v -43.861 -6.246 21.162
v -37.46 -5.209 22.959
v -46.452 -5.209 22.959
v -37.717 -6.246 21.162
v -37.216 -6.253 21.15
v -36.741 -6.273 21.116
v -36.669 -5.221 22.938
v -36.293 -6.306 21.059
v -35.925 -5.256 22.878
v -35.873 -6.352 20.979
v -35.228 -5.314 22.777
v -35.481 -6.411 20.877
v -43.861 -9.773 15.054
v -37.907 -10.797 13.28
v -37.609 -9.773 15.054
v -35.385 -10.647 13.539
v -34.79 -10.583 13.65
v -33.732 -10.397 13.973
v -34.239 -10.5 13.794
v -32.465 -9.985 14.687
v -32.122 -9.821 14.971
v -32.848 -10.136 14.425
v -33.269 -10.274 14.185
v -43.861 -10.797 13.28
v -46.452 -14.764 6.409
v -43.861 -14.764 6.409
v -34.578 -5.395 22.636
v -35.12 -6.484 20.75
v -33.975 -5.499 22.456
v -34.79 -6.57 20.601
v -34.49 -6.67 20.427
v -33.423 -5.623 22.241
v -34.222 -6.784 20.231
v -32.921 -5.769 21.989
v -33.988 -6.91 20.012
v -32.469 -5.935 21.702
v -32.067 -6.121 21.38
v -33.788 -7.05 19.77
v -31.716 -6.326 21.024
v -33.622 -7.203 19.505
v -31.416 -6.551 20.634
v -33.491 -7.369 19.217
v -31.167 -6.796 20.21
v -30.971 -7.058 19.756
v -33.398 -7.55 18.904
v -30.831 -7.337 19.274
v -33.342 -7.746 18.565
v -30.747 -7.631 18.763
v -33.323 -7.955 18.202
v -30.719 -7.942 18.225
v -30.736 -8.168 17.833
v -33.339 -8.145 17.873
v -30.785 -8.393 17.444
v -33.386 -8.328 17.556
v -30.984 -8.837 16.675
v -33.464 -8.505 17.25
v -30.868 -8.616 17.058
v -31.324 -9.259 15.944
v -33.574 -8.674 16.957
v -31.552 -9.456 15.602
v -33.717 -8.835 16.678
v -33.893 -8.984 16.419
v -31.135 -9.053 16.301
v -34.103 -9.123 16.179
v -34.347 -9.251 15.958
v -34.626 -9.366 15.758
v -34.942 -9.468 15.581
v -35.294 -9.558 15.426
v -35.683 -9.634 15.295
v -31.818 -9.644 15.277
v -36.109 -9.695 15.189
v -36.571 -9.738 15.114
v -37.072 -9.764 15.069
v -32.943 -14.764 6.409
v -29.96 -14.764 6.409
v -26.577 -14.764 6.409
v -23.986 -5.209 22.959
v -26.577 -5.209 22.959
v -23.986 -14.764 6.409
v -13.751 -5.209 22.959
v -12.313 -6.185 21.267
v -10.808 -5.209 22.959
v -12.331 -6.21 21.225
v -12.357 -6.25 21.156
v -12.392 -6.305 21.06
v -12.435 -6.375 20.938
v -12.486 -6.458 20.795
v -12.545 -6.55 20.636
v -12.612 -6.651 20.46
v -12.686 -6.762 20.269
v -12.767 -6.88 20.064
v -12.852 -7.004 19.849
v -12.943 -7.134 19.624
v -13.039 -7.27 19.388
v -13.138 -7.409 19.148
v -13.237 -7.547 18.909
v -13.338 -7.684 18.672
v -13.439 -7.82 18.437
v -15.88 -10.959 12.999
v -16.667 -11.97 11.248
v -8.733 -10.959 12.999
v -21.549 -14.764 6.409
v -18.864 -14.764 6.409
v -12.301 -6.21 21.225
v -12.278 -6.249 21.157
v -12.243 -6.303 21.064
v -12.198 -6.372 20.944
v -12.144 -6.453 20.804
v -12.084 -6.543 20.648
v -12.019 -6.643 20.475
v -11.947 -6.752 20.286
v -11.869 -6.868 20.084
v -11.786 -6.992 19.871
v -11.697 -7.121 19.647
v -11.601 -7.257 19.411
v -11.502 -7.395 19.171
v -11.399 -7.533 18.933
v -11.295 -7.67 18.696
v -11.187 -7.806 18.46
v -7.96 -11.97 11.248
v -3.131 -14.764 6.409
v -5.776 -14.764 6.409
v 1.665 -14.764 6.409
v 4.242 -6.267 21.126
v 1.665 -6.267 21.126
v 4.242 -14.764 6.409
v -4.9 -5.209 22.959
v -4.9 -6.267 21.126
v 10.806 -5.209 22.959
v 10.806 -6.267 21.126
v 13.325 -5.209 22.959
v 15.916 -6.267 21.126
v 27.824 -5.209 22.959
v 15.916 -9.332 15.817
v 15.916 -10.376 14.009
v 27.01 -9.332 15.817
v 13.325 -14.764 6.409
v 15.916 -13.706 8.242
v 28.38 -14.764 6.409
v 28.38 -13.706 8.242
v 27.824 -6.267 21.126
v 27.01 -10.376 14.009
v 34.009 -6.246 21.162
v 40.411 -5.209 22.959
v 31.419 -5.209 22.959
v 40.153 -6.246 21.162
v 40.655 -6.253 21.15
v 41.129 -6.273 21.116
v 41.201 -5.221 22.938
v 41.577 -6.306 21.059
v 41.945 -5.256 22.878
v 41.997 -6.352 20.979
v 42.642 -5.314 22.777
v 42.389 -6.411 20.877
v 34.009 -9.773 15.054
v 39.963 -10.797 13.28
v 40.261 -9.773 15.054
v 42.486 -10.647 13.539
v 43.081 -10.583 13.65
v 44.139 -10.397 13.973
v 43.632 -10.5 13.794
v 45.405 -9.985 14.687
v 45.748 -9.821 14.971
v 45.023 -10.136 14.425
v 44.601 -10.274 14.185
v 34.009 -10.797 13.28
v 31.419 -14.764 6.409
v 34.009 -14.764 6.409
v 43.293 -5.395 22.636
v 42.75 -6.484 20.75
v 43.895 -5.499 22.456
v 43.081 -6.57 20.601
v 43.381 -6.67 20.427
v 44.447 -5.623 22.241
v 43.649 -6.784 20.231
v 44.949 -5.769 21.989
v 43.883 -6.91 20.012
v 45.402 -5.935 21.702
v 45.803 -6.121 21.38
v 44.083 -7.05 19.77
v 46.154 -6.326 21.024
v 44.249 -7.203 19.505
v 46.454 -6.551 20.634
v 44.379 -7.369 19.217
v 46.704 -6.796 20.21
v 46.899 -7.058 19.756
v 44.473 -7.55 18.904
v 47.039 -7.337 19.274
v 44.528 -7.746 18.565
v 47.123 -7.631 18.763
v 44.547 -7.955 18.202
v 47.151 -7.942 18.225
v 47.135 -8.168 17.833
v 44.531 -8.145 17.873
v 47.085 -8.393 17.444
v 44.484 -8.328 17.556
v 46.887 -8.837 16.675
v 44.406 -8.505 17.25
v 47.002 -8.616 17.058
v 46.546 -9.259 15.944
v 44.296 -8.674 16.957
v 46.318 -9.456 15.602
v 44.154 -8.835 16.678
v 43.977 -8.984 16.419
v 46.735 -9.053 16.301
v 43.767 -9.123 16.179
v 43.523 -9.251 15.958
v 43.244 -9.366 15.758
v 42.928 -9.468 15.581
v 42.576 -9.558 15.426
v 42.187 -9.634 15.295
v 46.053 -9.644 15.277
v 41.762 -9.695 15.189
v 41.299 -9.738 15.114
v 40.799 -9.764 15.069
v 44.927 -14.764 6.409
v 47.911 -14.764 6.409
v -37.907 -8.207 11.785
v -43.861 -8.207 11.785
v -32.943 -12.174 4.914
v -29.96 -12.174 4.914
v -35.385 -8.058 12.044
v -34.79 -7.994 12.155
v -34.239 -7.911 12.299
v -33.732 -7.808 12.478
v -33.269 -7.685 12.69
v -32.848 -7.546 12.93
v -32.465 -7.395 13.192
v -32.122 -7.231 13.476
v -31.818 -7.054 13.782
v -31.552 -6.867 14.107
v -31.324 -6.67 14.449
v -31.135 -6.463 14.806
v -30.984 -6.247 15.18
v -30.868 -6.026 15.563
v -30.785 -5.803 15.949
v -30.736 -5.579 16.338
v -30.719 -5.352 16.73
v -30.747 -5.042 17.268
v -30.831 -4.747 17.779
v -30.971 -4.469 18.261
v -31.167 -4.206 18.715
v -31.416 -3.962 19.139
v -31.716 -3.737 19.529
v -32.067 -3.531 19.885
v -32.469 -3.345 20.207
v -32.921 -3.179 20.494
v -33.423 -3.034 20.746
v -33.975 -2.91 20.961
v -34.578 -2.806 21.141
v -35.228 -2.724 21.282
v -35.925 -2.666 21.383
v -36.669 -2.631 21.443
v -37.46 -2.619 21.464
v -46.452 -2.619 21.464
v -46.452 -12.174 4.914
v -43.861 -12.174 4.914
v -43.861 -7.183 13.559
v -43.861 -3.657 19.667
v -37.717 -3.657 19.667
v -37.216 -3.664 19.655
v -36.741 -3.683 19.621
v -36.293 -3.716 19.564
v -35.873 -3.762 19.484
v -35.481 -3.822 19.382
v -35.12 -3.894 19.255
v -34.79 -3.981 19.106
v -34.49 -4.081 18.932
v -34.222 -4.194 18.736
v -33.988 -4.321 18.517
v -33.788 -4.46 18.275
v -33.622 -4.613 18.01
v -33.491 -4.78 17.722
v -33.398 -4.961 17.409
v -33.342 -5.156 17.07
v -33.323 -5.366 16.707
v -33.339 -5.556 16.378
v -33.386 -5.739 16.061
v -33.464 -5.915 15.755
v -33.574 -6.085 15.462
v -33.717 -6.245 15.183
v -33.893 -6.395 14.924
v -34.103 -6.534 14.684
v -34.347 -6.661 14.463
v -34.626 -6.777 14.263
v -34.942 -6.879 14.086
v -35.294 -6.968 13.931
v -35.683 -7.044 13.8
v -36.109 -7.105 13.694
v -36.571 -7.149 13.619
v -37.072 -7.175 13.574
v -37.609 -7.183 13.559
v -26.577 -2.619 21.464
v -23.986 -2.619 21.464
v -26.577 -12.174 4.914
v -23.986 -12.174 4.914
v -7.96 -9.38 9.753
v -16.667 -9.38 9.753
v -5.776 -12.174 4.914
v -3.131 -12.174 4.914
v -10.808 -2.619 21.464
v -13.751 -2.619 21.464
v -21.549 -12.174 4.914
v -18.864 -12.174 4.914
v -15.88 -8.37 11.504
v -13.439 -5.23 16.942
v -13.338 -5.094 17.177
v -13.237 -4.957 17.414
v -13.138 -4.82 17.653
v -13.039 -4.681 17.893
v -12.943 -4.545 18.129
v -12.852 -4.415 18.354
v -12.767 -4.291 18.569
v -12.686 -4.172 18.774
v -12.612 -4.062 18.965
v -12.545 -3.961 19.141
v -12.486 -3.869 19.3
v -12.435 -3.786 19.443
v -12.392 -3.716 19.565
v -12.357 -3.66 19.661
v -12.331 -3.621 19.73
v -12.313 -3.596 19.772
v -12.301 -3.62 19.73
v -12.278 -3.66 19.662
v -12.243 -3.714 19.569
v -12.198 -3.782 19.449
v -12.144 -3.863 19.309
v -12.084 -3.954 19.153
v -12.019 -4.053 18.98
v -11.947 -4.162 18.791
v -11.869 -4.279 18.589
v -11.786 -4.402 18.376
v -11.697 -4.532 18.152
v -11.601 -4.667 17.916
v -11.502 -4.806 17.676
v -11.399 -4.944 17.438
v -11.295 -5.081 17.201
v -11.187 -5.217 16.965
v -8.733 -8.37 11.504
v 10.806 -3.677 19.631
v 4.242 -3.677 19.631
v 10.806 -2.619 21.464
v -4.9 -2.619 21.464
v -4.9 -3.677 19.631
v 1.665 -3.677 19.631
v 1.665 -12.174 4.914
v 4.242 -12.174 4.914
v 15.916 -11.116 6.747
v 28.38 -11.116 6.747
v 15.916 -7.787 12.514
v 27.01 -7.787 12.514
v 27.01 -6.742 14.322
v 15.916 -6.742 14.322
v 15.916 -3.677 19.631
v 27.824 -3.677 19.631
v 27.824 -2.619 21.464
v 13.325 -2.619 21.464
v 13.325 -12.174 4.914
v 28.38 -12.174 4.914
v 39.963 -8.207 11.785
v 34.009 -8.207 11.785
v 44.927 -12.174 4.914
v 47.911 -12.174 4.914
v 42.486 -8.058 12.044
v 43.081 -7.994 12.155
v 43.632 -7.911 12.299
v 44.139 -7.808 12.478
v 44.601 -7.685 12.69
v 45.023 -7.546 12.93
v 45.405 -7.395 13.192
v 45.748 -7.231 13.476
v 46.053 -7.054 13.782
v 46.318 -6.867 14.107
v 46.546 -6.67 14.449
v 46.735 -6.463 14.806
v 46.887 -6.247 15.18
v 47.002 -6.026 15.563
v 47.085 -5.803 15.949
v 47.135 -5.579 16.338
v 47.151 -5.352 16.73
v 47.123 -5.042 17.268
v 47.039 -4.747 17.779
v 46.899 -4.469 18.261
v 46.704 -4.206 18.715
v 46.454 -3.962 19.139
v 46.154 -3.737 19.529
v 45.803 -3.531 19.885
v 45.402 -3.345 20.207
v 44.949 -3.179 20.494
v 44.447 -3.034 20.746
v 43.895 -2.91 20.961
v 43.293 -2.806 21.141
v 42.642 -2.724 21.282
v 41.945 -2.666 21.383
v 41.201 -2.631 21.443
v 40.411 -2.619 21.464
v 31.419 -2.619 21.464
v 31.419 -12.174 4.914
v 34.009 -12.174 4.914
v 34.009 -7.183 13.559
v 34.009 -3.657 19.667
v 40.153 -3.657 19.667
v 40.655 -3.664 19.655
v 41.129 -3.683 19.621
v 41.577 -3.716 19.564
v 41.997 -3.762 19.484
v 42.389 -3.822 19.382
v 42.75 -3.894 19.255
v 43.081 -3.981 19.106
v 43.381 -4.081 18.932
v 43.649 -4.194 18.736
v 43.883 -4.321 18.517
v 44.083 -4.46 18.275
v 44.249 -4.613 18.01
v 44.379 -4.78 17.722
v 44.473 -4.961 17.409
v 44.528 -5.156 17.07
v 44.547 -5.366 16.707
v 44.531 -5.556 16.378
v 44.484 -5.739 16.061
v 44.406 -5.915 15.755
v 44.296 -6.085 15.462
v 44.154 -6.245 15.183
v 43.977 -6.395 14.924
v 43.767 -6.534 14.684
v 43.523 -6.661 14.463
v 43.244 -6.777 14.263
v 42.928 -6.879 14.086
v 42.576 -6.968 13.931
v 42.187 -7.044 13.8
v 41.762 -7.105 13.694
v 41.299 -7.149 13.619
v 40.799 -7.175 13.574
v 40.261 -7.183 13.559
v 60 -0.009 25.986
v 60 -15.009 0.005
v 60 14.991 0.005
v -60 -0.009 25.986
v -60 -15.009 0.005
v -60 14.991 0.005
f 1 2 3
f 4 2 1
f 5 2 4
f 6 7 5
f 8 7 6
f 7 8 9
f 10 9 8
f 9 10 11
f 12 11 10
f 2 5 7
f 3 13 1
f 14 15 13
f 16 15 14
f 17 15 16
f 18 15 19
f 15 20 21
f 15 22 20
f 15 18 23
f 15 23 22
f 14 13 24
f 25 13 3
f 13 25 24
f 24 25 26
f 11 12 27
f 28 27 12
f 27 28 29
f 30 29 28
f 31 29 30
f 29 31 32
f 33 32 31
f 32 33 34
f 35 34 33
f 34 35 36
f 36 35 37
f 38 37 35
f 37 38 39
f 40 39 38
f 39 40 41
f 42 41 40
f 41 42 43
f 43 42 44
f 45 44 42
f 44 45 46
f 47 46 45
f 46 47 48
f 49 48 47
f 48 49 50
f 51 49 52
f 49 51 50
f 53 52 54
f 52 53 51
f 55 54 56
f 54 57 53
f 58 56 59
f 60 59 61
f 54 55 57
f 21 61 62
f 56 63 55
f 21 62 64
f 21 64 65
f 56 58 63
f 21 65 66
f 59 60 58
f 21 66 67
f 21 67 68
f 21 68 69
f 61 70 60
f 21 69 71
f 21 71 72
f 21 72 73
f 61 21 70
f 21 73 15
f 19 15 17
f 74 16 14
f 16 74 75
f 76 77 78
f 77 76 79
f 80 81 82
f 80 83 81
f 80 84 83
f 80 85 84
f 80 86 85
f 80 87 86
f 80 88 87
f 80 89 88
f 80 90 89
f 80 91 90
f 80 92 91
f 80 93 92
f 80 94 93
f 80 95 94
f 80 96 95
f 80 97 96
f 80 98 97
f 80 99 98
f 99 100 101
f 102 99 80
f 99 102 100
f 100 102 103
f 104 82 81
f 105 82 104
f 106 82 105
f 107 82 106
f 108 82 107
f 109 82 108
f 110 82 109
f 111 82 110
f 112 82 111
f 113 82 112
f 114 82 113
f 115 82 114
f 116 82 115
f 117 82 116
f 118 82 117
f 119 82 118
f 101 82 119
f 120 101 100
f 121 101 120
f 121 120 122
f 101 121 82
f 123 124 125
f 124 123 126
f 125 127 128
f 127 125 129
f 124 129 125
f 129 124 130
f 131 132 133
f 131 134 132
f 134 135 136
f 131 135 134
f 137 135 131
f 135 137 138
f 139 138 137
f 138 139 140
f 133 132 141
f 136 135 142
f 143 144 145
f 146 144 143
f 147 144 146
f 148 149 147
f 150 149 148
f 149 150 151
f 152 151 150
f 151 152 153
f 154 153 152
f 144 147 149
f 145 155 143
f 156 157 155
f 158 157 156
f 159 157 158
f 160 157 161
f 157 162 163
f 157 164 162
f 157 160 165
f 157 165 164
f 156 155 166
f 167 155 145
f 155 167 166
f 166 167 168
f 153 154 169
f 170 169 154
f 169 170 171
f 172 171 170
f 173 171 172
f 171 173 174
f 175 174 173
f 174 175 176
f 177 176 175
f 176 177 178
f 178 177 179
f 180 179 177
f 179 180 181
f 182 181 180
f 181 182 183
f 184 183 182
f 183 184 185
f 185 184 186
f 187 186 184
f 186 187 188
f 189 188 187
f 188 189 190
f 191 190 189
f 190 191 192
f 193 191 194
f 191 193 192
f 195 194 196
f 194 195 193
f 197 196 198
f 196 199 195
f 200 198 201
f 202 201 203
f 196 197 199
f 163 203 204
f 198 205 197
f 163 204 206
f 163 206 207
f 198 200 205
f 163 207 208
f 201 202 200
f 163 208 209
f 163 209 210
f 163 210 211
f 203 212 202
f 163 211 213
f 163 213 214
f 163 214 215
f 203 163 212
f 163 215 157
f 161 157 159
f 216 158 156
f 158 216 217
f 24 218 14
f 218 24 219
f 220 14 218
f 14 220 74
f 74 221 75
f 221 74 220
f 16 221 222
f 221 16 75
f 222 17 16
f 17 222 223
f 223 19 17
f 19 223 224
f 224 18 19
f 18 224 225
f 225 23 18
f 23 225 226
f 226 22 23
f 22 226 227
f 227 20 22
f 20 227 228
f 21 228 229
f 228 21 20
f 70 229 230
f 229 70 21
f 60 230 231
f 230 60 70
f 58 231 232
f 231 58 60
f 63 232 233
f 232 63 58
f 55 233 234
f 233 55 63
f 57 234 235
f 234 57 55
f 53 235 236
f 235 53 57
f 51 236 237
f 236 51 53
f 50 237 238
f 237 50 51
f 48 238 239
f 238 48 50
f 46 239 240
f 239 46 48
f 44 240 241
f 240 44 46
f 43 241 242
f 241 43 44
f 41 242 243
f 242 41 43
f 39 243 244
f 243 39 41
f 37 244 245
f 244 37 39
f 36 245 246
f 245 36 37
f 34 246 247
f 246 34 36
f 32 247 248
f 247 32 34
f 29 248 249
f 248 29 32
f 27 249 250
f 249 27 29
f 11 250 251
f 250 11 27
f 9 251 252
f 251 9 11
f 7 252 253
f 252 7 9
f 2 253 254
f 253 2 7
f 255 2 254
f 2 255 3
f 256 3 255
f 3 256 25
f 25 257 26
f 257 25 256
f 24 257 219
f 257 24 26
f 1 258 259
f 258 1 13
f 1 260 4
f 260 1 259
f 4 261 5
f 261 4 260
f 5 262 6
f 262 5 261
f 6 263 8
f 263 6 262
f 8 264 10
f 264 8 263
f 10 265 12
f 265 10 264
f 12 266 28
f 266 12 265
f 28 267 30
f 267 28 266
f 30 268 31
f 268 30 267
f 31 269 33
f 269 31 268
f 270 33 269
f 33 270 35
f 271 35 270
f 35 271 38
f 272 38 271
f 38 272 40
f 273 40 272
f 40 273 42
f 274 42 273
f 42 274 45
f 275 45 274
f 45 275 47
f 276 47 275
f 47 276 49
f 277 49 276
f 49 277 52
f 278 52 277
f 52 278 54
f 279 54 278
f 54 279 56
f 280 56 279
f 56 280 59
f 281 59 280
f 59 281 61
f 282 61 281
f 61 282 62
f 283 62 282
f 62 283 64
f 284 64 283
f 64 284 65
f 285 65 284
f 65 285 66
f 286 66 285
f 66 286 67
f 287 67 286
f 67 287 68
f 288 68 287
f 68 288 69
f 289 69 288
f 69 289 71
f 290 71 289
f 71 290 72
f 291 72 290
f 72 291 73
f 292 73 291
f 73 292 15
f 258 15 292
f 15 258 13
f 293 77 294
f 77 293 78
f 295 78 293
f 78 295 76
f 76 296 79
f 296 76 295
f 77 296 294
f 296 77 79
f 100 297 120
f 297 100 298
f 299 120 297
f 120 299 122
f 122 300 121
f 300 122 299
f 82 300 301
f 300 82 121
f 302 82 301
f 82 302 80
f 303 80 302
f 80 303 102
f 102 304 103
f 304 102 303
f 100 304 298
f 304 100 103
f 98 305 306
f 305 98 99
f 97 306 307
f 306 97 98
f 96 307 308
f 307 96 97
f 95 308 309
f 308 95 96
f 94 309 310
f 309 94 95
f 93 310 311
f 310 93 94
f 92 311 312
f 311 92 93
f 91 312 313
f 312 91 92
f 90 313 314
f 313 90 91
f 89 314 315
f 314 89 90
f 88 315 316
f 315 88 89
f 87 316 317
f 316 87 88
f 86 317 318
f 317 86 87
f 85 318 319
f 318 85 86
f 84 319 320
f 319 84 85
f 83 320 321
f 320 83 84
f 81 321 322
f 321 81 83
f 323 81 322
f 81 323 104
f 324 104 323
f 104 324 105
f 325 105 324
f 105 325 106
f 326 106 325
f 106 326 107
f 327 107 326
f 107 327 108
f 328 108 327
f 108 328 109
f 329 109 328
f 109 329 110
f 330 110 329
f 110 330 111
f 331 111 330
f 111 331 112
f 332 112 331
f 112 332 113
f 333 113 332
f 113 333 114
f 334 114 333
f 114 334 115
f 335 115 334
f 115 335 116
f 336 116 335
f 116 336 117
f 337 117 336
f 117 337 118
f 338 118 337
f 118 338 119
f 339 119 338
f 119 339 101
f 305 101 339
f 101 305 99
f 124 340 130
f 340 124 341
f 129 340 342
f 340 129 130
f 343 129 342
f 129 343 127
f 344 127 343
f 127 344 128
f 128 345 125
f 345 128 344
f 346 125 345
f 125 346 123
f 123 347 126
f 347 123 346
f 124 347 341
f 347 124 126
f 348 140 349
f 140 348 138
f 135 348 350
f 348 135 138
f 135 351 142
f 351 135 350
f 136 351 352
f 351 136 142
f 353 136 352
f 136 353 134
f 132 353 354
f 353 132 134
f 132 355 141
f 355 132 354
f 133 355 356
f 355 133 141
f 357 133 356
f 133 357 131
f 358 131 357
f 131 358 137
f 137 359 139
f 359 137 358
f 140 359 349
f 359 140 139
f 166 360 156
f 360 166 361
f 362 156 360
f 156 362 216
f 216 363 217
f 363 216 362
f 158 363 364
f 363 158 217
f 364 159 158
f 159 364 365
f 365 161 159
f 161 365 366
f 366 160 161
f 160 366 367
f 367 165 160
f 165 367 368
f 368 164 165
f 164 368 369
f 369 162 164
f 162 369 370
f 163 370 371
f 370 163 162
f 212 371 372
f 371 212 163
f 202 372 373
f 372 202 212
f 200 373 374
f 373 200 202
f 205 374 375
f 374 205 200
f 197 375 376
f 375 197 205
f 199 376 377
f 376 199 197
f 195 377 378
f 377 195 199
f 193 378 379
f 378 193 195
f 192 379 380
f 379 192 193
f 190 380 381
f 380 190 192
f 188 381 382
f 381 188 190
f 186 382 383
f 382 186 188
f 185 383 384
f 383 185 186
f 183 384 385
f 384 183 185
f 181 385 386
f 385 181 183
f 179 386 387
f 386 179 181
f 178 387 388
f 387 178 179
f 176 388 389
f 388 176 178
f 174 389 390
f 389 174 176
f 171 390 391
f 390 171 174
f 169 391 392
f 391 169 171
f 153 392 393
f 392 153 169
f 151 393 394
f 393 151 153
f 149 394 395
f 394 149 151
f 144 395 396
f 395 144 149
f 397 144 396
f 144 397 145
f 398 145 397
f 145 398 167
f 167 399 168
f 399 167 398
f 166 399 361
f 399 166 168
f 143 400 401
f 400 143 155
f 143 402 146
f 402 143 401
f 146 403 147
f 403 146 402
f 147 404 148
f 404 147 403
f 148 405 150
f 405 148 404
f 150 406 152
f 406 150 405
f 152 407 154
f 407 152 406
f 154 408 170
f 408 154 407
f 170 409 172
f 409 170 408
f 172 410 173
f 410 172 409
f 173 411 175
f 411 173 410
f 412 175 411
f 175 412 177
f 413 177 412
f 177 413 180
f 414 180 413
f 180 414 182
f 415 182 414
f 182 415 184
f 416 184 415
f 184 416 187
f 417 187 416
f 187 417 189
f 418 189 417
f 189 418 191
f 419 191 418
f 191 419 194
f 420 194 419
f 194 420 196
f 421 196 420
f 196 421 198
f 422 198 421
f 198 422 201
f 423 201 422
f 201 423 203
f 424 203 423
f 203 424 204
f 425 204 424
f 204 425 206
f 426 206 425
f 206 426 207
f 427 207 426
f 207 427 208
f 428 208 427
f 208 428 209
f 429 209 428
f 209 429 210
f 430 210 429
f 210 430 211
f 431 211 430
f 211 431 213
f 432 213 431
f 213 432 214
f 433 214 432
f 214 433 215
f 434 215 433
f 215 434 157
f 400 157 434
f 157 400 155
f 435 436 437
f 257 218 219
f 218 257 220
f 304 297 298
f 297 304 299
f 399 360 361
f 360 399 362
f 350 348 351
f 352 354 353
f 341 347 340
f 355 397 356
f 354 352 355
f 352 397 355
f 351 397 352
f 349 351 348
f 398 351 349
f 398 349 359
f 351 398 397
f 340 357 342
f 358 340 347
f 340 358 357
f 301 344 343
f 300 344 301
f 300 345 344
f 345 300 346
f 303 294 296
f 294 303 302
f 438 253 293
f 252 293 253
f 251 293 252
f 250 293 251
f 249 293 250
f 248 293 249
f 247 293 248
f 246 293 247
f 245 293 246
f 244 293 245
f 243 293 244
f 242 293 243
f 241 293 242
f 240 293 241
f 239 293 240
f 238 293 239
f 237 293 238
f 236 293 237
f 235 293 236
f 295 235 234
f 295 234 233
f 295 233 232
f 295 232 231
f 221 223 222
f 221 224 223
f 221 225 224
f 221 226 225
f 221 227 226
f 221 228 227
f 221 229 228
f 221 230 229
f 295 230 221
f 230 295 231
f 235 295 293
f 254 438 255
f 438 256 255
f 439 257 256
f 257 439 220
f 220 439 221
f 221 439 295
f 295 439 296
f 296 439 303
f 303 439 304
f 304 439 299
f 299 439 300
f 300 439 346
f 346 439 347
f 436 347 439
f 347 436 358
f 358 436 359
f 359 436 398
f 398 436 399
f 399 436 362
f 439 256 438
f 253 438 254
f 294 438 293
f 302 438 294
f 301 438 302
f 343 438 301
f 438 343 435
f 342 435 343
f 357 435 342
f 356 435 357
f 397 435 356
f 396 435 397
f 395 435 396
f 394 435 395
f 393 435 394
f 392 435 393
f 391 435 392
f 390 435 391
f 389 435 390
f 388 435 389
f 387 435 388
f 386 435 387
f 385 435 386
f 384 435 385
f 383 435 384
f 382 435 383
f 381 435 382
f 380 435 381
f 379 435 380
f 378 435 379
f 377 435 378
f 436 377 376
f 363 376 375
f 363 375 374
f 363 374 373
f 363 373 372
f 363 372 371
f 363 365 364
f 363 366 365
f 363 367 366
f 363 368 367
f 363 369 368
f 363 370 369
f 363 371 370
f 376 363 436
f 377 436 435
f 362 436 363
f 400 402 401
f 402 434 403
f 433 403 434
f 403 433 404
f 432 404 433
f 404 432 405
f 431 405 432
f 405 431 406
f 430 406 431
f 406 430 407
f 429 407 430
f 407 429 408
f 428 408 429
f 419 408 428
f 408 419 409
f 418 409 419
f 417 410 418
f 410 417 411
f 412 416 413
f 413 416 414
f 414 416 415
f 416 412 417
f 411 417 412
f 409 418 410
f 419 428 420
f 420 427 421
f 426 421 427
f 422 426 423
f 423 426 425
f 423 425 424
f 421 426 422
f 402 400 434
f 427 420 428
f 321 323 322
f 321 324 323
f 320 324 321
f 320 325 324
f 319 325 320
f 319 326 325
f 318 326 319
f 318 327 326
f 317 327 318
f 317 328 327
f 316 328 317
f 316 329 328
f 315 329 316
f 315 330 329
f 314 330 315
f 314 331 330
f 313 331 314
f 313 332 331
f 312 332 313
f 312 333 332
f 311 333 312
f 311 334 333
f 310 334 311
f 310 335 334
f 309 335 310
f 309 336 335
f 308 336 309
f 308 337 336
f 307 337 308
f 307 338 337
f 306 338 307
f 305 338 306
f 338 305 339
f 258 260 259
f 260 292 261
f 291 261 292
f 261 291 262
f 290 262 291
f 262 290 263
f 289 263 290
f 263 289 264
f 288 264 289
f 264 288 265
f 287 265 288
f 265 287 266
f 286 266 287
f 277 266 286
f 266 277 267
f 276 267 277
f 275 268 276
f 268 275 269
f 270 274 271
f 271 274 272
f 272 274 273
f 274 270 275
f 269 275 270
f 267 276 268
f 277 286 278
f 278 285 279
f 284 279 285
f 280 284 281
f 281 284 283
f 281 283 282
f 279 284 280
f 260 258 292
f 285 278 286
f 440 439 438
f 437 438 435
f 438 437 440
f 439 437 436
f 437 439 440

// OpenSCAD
SLEN = 30;
LEN = 120;
Y = sqrt((SLEN * SLEN) - (SLEN/2)*(SLEN/2));
X = tan(30) * (SLEN/2);

TSIZE = 20;
TEXTH = 3;

module base() {
    translate([-LEN/2,-SLEN/2,(TEXTH)-0.01]) {
      rotate([90,0,90]) {
        linear_extrude(LEN) {
        polygon([ [0,0], [SLEN,0], [SLEN/2, Y]] );
      }
    }
  }
}

module txt(T) {
  mirror() {
    linear_extrude(TEXTH) {
      text(T, size=TSIZE, halign="center", valign="center");
    }
  }      
}

//------------------------------------------------------
echo("Y is", Y);
echo("X is", X);
rotate([0,0,180]) {
  translate([0,0, X]) {
    rotate([120,0,0]) {
      translate([0,0, -(TEXTH + X)]) {
        color("blue") txt("RIATER");
        color("white") base();
      }
    }
  }
}
